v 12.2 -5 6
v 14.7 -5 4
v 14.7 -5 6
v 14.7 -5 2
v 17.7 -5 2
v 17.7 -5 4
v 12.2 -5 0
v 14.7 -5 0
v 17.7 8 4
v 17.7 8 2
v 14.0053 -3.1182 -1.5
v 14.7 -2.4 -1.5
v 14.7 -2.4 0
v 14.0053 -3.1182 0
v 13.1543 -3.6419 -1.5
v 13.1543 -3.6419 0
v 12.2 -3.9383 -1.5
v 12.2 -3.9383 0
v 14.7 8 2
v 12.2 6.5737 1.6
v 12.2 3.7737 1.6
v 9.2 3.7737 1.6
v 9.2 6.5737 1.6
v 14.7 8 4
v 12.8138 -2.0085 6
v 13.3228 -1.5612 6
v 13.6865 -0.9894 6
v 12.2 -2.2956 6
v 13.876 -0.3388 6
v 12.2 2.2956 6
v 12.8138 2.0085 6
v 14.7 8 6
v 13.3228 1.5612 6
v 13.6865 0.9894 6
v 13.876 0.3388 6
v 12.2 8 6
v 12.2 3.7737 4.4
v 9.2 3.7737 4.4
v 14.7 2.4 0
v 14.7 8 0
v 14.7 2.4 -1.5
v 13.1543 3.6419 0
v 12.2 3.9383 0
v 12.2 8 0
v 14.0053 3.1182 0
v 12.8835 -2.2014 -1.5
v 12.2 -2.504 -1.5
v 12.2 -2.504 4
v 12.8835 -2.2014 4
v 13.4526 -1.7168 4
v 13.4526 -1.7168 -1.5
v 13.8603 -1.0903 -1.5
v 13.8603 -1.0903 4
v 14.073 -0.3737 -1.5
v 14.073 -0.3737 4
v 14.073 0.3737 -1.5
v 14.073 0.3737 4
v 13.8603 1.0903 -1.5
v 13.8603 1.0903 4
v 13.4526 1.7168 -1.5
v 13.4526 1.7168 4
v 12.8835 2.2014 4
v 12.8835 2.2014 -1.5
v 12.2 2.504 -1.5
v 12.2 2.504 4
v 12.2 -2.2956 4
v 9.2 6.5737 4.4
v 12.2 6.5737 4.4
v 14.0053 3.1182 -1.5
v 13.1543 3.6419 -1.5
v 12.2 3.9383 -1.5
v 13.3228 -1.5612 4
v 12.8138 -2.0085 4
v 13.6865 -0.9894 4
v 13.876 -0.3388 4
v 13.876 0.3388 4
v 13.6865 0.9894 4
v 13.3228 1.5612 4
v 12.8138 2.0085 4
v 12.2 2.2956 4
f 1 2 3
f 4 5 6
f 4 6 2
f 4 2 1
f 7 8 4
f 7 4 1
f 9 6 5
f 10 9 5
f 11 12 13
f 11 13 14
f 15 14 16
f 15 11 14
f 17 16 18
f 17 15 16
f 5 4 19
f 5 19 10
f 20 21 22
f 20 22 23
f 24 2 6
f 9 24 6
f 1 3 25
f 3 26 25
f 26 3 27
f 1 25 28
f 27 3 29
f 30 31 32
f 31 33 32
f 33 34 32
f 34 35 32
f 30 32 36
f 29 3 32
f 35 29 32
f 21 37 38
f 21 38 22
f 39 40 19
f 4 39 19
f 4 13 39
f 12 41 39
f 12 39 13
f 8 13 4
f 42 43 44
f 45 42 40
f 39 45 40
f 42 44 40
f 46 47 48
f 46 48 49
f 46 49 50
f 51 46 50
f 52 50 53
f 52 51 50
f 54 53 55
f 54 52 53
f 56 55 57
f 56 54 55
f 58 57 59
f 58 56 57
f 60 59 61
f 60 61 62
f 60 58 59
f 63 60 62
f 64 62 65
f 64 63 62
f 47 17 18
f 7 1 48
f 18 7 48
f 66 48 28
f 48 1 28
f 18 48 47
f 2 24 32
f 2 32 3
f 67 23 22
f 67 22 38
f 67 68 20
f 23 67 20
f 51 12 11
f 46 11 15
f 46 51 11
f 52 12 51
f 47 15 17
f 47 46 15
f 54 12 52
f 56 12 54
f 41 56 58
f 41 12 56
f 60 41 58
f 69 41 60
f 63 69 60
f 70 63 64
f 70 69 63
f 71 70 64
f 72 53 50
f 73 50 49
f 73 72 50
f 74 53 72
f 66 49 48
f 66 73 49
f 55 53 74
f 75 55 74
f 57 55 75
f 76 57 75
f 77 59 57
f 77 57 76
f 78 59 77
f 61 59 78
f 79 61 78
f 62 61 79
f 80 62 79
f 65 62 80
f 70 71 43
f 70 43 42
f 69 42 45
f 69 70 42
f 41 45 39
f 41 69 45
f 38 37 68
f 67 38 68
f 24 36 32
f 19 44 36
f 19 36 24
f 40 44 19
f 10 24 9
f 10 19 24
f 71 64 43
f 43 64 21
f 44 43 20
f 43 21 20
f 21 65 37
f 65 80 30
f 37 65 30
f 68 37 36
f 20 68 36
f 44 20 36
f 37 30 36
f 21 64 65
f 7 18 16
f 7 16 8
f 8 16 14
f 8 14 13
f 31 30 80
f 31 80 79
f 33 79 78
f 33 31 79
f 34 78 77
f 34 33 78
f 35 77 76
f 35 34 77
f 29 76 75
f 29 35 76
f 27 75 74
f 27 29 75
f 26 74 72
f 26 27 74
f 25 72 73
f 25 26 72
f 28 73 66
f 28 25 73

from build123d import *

# Parameters (mm, degrees)
SKETCH1_R            = 1
BOSS_EXTRUDE1_DEPTH  = 6
SKETCH2_R            = 2.6
CUT_EXTRUDE1_DEPTH   = 6
SKETCH3_W            = 7.6
SKETCH3_H            = 13
BOSS_EXTRUDE2_DEPTH  = 6
BOSS_EXTRUDE5_START  = -5
SKETCH6_W            = 3
SKETCH6_H            = 2
BOSS_EXTRUDE5_DEPTH  = 13
BOSS_EXTRUDE6_START  = -7.5
SKETCH10_R           = 4
SKETCH10_R_2         = 2.6
BOSS_EXTRUDE6_DEPTH  = 1.5
BOSS_EXTRUDE7_START  = -6
SKETCH12_R           = 2.6
SKETCH12_R_2         = 2.4
BOSS_EXTRUDE7_DEPTH  = 2
CUT_EXTRUDE2_DEPTH   = 7
SKETCH14_W           = 3
SKETCH14_H           = 6
CUT_EXTRUDE3_DEPTH   = 2
SKETCH15_W           = 0.2
SKETCH15_H           = 13
CUT_EXTRUDE5_DEPTH   = 7.5
SKETCH16_W           = 3
SKETCH16_H           = 3
CUT_EXTRUDE6_DEPTH   = 3
SKETCH17_W           = 2.8
SKETCH17_H           = 2.8
BOSS_EXTRUDE9_DEPTH  = 3
BOSS_EXTRUDE10_START = 24.4
SKETCH17_2_W         = 2.8
SKETCH17_2_H         = 2.8
BOSS_EXTRUDE10_DEPTH = 3
SKETCH18_W           = 37.3
SKETCH18_H           = 13
CUT_EXTRUDE11_DEPTH  = 9
SKETCH20_W           = 2.8
SKETCH20_H           = 2.8
BOSS_EXTRUDE11_DEPTH = 3


with BuildPart() as part:
    # Sketch1 → Boss-Extrude1 (new body)
    with BuildSketch(Plane.XY):
        with BuildLine():
            ThreePointArc((3.75, -5), (4.47902769, -4.358991965), (5.1, -3.61282438))
            Line((5.1, -3.61282438), (5.1, 3.61282438))
            ThreePointArc((5.1, 3.61282438), (0, 6.25), (-5.1, 3.61282438))
            Line((-5.1, 3.61282438), (-5.1, -3.61282438))
            ThreePointArc((-5.1, -3.61282438), (-4.47902769, -4.358991965), (-3.75, -5))
            Line((-3.75, -5), (-14.7, -5))
            Line((-14.7, -5), (-14.7, 8))
            Line((-14.7, 8), (14.7, 8))
            Line((14.7, 8), (14.7, -5))
            Line((14.7, -5), (3.75, -5))
        make_face()
        with Locations((11.5, 0)):
            Circle(SKETCH1_R, mode=Mode.SUBTRACT)
        with Locations((-11.5, 0)):
            Circle(SKETCH1_R, mode=Mode.SUBTRACT)
    extrude(amount=BOSS_EXTRUDE1_DEPTH)

    # Sketch2 → Cut-Extrude1 (cut)
    with BuildSketch(Plane.XY):
        with Locations((-11.5, 0)):
            Circle(SKETCH2_R)
        with Locations((11.5, 0)):
            Circle(SKETCH2_R)
    extrude(amount=CUT_EXTRUDE1_DEPTH, mode=Mode.SUBTRACT)

    # Sketch3 → Boss-Extrude2 (add)
    with BuildSketch(Plane.XY):
        with Locations((-18.5, 1.5)):
            Rectangle(SKETCH3_W, SKETCH3_H)
    extrude(amount=BOSS_EXTRUDE2_DEPTH)

    # Sketch6 → Boss-Extrude5 (add)
    with BuildSketch(Plane(origin=(0, 0, 0), x_dir=(1, 0, 0), z_dir=(0, 1, 0)).offset(BOSS_EXTRUDE5_START)):
        with Locations((-23.8, -3)):
            Rectangle(SKETCH6_W, SKETCH6_H)
        with Locations((16.2, -3)):
            Rectangle(SKETCH6_W, SKETCH6_H)
    extrude(amount=BOSS_EXTRUDE5_DEPTH)

    # Sketch10 → Boss-Extrude6 (add)
    with BuildSketch(Plane.XY.offset(6).offset(BOSS_EXTRUDE6_START)):
        with Locations((-11.5, 0)):
            Circle(SKETCH10_R)
        with Locations((-11.5, 0)):
            Circle(SKETCH10_R_2, mode=Mode.SUBTRACT)
        with BuildLine():
            Line((14.7, 2.4), (14.7, -2.4))
            ThreePointArc((14.7, -2.4), (7.5, 0), (14.7, 2.4))
        make_face()
        with Locations((11.5, 0)):
            Circle(SKETCH10_R_2, mode=Mode.SUBTRACT)
    extrude(amount=BOSS_EXTRUDE6_DEPTH)

    # Sketch12 → Boss-Extrude7 (add)
    with BuildSketch(Plane(origin=(0, 0, 0), x_dir=(-1, 0, 0), z_dir=(0, 0, -1)).offset(BOSS_EXTRUDE7_START)):
        with Locations((11.5, 0)):
            Circle(SKETCH12_R)
        with Locations((11.5, 0)):
            Circle(SKETCH12_R_2, mode=Mode.SUBTRACT)
        with Locations((-11.5, 0)):
            Circle(SKETCH12_R)
        with Locations((-11.5, 0)):
            Circle(SKETCH12_R_2, mode=Mode.SUBTRACT)
    extrude(amount=BOSS_EXTRUDE7_DEPTH)

    # Sketch13 → Cut-Extrude2 (cut)
    with BuildSketch(Plane.XZ.offset(5)):
        Polygon((-22.3, 0), (-16.3, 0), (-16.3, 2), (-17.8, 2), (-17.8, 6), (-20.8, 6), (-20.8, 2), (-22.3, 2), align=None)
    extrude(amount=-CUT_EXTRUDE2_DEPTH, mode=Mode.SUBTRACT)

    # Sketch14 → Cut-Extrude3 (cut)
    with BuildSketch(Plane(origin=(0, 0, 0), x_dir=(-1, 0, 0), z_dir=(0, 0, -1))):
        with Locations((19.3, 5)):
            Rectangle(SKETCH14_W, SKETCH14_H)
    extrude(amount=-CUT_EXTRUDE3_DEPTH, mode=Mode.SUBTRACT)

    # Sketch15 → Cut-Extrude5 (cut, symmetric)
    with BuildSketch(Plane.XY):
        with Locations((-12.1, 1.5)):
            Rectangle(SKETCH15_W, SKETCH15_H)
        with Locations((12.1, 1.5)):
            Rectangle(SKETCH15_W, SKETCH15_H)
    extrude(amount=CUT_EXTRUDE5_DEPTH, both=True, mode=Mode.SUBTRACT)

    # Sketch16 → Cut-Extrude6 (cut)
    with BuildSketch(Plane(origin=(12, 0, 0), x_dir=(0, 0, -1), z_dir=(1, 0, 0))):
        with Locations((-3, 5.173669459)):
            Rectangle(SKETCH16_W, SKETCH16_H)
    cut_extrude6 = extrude(amount=-CUT_EXTRUDE6_DEPTH, mode=Mode.SUBTRACT)

    # Mirror1: Cut-Extrude6 across plane
    add(cut_extrude6.mirror(Plane(origin=(0, 0, 0), x_dir=(0, 0, 1), z_dir=(1, 0, 0))), mode=Mode.SUBTRACT)

    # Sketch17 → Boss-Extrude9 (add)
    with BuildSketch(Plane(origin=(-12.2, 0, 0), x_dir=(0, 0, -1), z_dir=(1, 0, 0))):
        with Locations((-3, 5.173669459)):
            Rectangle(SKETCH17_W, SKETCH17_H)
    extrude(amount=BOSS_EXTRUDE9_DEPTH)

    # Sketch17<2> → Boss-Extrude10 (add)
    with BuildSketch(Plane(origin=(-12.2, 0, 0), x_dir=(0, 0, -1), z_dir=(1, 0, 0)).offset(BOSS_EXTRUDE10_START)):
        with Locations((-3, 5.173669459)):
            Rectangle(SKETCH17_2_W, SKETCH17_2_H)
    extrude(amount=-BOSS_EXTRUDE10_DEPTH)

    # Sketch18 → Cut-Extrude11 (cut, symmetric)
    with BuildSketch(Plane.XY):
        with Locations((-6.65, 1.5)):
            Rectangle(SKETCH18_W, SKETCH18_H)
    extrude(amount=CUT_EXTRUDE11_DEPTH, both=True, mode=Mode.SUBTRACT)

    # Sketch20 → Boss-Extrude11 (add)
    with BuildSketch(Plane.ZY.offset(-12.2)):
        with Locations((3, 5.173669459)):
            Rectangle(SKETCH20_W, SKETCH20_H)
    extrude(amount=BOSS_EXTRUDE11_DEPTH)


solid = part.part
